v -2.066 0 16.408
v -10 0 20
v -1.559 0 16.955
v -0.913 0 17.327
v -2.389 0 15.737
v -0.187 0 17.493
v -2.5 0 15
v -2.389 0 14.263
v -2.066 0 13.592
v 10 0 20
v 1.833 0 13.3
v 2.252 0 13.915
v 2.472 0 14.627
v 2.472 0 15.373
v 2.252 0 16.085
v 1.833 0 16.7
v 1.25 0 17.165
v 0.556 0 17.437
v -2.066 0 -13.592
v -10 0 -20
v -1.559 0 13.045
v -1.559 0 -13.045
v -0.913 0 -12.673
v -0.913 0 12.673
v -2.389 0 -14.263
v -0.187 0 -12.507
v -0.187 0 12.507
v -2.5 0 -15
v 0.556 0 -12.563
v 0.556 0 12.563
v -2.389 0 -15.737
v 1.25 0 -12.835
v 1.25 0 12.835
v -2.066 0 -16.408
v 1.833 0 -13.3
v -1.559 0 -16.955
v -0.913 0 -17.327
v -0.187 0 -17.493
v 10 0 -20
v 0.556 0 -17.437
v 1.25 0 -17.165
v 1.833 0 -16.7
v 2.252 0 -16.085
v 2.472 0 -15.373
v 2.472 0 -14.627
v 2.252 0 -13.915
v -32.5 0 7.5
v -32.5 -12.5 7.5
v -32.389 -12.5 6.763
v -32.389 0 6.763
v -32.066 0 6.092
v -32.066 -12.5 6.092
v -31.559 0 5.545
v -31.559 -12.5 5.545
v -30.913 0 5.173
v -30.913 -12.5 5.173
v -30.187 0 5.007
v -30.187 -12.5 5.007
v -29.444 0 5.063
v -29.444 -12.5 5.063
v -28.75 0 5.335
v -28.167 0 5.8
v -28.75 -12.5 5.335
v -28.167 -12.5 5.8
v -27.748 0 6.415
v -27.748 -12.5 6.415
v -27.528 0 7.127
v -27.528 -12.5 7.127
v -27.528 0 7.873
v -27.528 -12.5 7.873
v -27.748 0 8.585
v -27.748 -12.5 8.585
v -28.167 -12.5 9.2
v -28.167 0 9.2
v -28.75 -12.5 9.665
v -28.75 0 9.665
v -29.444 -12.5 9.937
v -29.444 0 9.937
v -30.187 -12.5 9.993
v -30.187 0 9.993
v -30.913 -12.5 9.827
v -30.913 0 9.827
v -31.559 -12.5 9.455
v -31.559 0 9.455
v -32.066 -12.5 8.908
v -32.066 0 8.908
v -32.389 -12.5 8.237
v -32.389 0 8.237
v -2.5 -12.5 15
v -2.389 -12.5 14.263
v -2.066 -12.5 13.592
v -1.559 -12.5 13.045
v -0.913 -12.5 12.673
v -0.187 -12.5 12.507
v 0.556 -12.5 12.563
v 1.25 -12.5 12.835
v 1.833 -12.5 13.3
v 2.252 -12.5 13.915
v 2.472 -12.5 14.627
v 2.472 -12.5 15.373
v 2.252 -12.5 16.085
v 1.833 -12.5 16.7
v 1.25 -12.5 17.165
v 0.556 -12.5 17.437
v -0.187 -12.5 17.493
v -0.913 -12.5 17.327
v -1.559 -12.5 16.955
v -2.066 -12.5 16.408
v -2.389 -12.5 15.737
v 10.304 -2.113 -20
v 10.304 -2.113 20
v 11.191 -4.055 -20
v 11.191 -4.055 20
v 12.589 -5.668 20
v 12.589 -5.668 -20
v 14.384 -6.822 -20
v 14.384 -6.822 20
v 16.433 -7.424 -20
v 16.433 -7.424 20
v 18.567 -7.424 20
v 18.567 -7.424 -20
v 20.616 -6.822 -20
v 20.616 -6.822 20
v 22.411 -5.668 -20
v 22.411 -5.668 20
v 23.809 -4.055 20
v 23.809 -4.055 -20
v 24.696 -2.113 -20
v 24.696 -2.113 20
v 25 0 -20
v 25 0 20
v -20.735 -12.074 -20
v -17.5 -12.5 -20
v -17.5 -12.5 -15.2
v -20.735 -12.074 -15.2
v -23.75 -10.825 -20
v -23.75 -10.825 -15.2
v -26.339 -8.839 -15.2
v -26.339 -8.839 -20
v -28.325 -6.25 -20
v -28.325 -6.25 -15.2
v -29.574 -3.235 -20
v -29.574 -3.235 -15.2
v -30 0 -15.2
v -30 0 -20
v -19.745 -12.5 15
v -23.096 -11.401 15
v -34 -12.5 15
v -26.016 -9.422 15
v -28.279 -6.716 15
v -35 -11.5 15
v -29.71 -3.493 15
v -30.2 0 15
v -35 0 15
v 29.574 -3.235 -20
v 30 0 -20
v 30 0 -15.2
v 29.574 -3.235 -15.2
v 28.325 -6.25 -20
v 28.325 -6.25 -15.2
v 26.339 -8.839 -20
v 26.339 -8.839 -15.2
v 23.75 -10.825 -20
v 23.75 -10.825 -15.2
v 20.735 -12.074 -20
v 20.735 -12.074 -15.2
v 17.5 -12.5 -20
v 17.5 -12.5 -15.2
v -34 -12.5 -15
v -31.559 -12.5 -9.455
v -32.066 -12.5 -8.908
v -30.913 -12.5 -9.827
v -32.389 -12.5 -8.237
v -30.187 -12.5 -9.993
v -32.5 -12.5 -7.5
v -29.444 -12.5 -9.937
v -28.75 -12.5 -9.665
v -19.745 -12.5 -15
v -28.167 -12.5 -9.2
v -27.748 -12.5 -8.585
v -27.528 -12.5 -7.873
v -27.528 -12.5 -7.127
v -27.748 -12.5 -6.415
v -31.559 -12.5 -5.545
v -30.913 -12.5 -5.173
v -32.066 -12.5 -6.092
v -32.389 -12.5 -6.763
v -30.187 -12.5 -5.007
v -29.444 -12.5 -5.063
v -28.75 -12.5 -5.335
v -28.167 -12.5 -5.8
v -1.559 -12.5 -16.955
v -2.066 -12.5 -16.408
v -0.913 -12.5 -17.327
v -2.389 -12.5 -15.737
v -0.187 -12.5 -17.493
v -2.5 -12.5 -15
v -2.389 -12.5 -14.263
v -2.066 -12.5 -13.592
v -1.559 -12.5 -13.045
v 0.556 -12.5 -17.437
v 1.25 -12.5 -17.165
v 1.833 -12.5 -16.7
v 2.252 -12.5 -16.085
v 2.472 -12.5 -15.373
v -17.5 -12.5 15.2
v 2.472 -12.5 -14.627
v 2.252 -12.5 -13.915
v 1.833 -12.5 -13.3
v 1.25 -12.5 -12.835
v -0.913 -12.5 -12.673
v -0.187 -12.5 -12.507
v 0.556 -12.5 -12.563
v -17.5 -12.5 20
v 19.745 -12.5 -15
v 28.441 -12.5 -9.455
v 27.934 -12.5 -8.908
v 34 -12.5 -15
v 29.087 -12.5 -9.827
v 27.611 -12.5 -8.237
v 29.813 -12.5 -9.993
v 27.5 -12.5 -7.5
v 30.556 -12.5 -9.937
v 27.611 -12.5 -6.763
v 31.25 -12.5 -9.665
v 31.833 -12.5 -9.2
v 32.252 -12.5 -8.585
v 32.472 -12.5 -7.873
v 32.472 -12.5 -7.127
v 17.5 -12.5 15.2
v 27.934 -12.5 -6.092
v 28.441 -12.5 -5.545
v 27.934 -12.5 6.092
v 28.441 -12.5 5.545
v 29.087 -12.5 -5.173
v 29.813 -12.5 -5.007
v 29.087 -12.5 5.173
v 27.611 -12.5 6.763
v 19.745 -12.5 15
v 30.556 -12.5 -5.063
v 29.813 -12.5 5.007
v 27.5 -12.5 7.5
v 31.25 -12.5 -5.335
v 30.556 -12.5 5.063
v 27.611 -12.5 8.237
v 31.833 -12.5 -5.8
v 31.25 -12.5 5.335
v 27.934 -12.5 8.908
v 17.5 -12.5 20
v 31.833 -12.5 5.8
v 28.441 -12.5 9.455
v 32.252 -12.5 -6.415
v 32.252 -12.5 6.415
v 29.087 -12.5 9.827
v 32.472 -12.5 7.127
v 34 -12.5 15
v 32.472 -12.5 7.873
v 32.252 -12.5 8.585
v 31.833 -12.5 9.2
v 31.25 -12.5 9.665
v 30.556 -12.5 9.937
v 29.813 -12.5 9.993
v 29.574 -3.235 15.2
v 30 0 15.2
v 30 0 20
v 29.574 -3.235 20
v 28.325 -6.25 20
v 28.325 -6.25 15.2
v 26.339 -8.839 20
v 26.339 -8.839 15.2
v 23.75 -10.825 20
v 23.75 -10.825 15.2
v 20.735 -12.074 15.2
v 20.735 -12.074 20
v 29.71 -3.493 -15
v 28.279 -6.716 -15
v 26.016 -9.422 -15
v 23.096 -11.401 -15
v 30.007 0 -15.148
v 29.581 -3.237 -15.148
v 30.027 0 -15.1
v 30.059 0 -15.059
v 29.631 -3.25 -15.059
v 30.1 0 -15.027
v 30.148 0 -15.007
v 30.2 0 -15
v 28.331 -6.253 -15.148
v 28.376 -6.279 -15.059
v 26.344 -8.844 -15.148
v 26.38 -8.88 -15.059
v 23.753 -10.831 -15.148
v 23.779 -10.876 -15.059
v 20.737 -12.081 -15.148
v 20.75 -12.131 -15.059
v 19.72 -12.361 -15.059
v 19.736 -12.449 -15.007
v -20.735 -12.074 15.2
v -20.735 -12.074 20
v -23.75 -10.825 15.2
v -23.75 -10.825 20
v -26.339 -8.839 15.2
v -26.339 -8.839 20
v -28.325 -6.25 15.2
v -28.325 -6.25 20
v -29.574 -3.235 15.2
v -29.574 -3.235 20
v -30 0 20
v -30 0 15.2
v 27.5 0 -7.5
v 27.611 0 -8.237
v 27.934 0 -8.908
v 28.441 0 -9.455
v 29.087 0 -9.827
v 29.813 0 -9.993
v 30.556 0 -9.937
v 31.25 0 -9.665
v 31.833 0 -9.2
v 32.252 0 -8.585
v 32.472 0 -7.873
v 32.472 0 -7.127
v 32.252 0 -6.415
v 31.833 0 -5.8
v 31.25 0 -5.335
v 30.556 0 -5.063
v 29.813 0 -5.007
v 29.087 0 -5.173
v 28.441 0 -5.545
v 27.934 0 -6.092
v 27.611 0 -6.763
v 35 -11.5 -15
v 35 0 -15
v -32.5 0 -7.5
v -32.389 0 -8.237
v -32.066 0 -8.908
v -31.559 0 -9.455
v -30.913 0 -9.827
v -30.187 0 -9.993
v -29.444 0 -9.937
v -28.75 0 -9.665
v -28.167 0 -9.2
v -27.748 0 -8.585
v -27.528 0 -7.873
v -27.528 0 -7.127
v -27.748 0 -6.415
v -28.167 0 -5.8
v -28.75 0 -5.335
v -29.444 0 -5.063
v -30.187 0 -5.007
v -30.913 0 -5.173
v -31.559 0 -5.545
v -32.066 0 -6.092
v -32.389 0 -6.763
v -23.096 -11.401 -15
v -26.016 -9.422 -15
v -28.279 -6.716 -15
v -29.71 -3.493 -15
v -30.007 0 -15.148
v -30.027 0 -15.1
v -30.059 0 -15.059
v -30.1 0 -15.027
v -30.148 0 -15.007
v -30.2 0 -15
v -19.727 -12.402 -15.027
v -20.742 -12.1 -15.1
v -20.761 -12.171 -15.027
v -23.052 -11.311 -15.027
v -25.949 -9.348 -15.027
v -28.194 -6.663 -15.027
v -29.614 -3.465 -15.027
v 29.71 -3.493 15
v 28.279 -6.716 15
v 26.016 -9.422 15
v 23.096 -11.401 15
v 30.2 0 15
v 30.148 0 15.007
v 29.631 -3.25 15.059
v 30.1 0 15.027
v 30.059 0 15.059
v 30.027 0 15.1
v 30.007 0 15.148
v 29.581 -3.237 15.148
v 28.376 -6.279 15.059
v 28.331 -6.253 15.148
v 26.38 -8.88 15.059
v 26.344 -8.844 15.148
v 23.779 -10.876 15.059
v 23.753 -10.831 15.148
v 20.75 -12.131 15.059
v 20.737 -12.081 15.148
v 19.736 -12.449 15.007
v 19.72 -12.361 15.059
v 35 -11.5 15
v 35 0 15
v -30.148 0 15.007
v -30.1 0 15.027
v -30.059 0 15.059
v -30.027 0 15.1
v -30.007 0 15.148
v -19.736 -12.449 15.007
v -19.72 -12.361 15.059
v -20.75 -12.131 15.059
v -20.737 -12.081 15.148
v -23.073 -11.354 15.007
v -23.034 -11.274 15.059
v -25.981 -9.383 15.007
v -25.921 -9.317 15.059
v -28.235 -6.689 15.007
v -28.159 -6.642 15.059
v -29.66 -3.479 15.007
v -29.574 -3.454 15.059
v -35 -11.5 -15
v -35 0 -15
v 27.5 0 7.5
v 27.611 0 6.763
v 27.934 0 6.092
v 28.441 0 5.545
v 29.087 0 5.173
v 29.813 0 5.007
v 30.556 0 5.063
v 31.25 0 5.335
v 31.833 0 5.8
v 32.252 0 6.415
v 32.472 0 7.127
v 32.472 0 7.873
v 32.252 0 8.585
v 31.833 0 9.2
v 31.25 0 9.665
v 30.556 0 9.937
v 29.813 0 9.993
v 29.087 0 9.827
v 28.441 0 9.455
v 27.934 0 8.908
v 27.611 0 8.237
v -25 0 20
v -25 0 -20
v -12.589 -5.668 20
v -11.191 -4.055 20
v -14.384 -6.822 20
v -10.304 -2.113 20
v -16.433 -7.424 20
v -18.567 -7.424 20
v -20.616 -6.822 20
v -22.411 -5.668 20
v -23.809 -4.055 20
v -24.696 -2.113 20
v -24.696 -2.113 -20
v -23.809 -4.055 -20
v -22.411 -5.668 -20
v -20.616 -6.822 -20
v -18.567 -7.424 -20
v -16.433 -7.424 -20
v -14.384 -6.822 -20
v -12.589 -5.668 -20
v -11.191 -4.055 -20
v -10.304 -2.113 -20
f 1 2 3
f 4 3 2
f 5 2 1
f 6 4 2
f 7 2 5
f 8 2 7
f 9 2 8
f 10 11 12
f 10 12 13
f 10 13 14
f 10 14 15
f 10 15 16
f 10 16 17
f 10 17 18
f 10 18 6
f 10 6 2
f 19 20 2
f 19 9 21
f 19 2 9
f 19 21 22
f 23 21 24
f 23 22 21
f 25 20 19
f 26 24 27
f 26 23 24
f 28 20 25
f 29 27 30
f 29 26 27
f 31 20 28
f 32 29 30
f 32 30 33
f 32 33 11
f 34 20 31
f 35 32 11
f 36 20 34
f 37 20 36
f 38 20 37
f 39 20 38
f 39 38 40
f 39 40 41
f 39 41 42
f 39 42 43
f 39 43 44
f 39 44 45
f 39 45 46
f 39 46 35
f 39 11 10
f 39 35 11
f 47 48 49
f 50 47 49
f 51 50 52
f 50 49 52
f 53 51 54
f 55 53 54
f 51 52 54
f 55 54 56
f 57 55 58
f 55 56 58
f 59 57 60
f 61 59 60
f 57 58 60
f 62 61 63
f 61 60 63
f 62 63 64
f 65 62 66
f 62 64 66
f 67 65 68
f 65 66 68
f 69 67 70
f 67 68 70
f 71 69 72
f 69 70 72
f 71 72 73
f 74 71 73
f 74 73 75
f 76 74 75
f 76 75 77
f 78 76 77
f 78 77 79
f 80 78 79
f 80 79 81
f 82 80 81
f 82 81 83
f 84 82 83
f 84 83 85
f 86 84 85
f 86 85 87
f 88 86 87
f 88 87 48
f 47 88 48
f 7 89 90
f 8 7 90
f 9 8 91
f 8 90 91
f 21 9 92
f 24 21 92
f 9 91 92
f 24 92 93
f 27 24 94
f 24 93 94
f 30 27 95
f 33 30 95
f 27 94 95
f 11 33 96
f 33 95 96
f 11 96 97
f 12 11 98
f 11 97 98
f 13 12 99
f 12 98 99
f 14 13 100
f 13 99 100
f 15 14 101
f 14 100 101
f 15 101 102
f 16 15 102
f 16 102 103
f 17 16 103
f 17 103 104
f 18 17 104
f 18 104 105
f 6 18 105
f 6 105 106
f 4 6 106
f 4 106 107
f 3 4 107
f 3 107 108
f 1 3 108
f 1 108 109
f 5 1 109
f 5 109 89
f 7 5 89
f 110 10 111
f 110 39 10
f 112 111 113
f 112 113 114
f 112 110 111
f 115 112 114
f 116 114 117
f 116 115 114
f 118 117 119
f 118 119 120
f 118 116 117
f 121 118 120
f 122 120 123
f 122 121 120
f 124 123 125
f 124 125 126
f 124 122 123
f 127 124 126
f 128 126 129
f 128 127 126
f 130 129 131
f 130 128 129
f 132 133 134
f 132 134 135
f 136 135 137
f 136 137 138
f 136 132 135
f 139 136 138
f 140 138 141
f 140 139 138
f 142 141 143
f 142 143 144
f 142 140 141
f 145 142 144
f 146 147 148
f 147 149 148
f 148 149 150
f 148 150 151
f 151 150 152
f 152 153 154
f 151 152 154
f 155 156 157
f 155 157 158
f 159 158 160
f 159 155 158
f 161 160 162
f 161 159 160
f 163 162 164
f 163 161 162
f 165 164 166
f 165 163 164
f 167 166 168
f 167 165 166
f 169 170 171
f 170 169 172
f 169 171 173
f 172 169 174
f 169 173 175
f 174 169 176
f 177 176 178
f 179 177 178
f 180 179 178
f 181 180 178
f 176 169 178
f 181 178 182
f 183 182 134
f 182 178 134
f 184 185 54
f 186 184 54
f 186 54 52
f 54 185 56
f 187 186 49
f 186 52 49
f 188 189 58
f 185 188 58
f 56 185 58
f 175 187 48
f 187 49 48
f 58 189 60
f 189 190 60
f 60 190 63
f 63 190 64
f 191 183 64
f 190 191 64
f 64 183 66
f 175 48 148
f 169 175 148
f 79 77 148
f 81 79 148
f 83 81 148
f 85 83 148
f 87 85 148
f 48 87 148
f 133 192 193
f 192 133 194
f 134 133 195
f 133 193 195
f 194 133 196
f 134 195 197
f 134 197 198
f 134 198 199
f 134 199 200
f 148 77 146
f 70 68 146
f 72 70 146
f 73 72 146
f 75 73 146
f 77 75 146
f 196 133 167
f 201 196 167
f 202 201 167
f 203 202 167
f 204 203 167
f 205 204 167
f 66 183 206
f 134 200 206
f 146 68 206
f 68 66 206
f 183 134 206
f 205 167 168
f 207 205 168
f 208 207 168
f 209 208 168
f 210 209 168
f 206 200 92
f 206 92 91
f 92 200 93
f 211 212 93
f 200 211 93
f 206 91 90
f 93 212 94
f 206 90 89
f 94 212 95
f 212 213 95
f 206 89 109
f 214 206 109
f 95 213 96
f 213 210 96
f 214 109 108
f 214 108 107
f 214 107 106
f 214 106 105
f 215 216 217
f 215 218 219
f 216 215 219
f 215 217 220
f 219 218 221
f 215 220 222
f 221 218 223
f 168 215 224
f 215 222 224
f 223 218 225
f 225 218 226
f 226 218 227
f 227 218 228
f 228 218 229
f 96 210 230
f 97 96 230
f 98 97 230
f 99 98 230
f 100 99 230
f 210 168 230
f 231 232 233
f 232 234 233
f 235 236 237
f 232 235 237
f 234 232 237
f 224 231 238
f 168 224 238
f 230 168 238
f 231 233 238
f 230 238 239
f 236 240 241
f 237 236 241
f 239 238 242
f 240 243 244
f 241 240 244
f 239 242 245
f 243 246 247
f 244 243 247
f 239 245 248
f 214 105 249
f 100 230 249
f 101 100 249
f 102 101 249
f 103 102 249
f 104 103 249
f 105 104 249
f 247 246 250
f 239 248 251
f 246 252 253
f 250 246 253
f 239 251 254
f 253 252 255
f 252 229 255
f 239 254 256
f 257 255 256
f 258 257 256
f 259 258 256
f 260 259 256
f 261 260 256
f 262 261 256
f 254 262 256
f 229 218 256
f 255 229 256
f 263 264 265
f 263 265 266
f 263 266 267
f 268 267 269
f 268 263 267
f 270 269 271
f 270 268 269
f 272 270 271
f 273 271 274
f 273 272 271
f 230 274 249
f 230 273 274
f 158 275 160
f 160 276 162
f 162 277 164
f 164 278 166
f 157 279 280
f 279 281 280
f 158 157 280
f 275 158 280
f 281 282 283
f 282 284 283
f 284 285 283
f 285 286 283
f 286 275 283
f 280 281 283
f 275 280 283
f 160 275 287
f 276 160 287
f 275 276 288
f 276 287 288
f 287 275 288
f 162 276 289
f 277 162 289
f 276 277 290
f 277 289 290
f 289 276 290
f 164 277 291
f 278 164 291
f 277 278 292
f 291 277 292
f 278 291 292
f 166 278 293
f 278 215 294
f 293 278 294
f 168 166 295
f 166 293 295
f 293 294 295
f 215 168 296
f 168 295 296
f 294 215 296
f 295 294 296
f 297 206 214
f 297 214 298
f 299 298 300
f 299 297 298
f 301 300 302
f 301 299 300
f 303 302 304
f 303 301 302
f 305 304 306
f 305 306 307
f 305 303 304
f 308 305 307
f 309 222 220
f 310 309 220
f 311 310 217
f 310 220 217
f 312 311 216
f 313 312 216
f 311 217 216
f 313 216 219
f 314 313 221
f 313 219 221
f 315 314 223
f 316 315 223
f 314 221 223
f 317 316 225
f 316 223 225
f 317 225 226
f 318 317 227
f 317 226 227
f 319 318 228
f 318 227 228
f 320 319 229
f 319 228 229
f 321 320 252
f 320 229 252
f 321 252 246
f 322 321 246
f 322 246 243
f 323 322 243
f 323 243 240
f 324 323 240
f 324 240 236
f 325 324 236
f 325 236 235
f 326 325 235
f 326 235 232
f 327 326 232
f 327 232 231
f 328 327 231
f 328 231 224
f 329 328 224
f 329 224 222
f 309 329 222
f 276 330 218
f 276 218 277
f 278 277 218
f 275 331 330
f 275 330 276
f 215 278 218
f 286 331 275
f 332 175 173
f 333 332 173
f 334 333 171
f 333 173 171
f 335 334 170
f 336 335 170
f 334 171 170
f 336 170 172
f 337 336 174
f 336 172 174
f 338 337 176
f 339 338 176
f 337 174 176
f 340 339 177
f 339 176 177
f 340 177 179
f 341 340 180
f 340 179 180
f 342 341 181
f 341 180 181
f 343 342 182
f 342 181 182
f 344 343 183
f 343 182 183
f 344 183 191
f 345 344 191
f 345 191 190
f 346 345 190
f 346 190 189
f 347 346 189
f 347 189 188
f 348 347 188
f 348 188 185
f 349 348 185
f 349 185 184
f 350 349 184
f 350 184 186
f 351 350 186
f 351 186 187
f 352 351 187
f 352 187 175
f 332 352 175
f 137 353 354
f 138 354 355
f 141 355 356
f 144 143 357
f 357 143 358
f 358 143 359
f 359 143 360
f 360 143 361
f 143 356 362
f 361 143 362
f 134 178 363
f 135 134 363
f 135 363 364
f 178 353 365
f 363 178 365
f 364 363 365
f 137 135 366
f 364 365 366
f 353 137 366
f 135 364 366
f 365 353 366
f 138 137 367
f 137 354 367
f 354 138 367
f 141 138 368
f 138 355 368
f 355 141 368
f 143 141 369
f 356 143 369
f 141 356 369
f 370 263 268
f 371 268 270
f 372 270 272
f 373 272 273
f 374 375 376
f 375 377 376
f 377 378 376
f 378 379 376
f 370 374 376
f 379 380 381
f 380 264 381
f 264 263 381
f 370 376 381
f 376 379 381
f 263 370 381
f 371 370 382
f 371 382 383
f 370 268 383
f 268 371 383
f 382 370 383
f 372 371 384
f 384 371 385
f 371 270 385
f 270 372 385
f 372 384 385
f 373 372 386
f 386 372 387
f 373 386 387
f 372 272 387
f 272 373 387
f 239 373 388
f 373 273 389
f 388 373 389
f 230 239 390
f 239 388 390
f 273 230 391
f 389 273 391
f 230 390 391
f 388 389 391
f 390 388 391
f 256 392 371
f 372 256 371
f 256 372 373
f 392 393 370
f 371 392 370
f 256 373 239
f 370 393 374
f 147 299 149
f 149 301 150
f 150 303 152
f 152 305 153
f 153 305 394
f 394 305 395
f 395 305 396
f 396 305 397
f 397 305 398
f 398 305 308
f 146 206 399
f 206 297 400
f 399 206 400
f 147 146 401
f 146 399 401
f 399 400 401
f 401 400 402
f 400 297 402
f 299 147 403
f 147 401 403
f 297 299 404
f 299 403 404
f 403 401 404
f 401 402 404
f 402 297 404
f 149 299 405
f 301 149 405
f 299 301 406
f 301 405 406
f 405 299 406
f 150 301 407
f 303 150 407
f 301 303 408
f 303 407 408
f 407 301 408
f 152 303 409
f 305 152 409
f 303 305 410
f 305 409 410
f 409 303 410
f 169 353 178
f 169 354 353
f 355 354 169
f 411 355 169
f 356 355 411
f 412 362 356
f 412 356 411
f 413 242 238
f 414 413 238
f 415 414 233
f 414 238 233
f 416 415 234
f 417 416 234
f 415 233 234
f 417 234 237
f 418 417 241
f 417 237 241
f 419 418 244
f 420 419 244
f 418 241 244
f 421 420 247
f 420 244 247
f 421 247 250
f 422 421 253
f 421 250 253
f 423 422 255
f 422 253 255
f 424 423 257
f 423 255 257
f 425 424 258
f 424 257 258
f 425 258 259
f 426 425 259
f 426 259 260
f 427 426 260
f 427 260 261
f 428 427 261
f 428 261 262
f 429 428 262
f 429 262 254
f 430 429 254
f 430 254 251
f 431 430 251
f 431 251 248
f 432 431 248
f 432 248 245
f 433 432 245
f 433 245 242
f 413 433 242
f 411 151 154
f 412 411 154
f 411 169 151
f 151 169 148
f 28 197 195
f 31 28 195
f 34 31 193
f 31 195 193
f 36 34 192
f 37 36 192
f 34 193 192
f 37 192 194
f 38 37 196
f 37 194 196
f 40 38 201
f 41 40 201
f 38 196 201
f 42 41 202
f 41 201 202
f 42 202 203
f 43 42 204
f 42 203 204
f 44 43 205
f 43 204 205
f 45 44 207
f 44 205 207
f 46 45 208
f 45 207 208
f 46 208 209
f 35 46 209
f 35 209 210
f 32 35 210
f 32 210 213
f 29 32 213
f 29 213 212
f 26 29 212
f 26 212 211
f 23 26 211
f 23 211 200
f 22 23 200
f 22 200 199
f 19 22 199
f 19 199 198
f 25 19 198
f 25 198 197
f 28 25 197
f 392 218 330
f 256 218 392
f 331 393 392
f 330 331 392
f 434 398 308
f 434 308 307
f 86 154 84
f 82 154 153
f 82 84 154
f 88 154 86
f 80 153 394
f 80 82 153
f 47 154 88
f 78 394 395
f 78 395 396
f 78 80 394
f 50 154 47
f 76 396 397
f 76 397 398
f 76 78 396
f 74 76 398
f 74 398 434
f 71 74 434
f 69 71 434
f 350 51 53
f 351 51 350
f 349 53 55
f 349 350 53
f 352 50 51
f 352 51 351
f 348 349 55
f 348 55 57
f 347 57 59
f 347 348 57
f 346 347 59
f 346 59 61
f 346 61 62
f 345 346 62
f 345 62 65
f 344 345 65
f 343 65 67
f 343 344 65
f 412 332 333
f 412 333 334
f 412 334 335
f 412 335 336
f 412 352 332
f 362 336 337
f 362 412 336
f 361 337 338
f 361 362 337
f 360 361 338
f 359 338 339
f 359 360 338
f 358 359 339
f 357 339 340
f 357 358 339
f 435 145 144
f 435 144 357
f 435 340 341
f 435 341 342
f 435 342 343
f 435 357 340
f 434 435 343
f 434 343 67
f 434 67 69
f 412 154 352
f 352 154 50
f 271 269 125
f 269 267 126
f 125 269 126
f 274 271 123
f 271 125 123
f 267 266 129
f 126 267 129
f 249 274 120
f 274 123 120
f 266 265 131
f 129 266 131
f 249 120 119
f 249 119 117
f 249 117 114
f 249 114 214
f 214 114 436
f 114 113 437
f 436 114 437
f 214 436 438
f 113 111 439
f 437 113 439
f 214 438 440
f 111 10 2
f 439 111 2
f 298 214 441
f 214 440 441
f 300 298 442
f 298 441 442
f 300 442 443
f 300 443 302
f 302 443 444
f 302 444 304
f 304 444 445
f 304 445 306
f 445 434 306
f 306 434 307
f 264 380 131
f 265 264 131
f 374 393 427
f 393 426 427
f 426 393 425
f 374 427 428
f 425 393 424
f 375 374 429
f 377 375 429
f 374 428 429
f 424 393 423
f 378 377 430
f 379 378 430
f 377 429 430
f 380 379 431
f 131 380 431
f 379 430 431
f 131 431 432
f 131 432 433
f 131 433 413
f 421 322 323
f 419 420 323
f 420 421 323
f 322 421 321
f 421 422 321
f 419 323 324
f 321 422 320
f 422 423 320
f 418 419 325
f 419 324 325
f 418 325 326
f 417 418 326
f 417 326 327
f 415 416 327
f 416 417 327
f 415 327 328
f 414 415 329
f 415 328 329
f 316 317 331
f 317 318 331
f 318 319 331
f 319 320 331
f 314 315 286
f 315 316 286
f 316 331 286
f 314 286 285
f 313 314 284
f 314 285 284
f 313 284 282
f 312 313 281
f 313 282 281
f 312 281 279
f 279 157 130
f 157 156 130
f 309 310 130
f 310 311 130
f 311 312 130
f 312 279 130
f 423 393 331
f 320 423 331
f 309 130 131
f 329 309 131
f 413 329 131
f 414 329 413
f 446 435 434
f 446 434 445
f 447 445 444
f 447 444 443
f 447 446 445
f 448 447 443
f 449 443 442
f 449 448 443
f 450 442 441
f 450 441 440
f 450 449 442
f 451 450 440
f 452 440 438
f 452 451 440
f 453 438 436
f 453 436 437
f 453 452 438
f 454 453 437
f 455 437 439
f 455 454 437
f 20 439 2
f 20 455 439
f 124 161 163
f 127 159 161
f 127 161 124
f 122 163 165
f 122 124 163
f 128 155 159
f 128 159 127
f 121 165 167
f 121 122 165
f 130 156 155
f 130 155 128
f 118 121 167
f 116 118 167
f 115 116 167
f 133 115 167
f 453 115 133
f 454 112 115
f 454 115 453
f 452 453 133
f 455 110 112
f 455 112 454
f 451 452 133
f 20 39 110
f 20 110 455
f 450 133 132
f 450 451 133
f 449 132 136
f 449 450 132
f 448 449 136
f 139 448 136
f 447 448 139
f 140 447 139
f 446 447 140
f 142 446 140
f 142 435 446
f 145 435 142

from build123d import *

# Parameters (mm, degrees)
EXTRUDE_1_DEPTH      = 20
EXTRUDE_1_DEPTH_BACK = 20
EXTRUDE_2_DEPTH      = 15
EXTRUDE_2_DEPTH_BACK = 15
CHAMFER_1_SIZE       = 1
HOLE_WIZARD_5_0_1_D  = 5
FILLET_1_R           = 0.2


with BuildPart() as part:
    # Эскиз1 → Бобышка-Вытянуть1 (new, two sides: drawn at the far end of the back side and taken through both)
    with BuildSketch(Plane.XY.offset(-EXTRUDE_1_DEPTH_BACK)):
        with BuildLine():
            Line((17.5, -12.5), (-17.5, -12.5))
            ThreePointArc((-17.5, -12.5), (-26.338834764831844, -8.838834764831844), (-30.000000000000004, 0))
            Line((-30.000000000000004, 0), (-25, 0))
            ThreePointArc((-25, 0), (-17.5, -7.499999999999998), (-10.000000000000002, 0))
            Line((-10.000000000000002, 0), (10.000000000000002, 0))
            ThreePointArc((10.000000000000002, 0), (17.5, -7.499999999999998), (25, 0))
            Line((25, 0), (30.000000000000004, 0))
            ThreePointArc((30.000000000000004, 0), (26.338834764831844, -8.838834764831843), (17.5, -12.5))
        make_face()
    extrude(amount=EXTRUDE_1_DEPTH + EXTRUDE_1_DEPTH_BACK)

    # Эскиз2 → Бобышка-Вытянуть2 (add, two sides: drawn at the far end of the back side and taken through both)
    with BuildSketch(Plane.XY.offset(-EXTRUDE_2_DEPTH_BACK)):
        with BuildLine():
            Line((30.000000000000004, 0), (35, 0))
            Line((35, 0), (35, -12.499999999999996))
            Line((35, -12.499999999999996), (17.5, -12.5))
            Line((17.5, -12.5), (-17.500000000000004, -12.5))
            Line((-17.500000000000004, -12.5), (-35, -12.499999999999996))
            Line((-35, -12.499999999999996), (-35, 0))
            Line((-35, 0), (-30.000000000000004, 1.53e-15))
            Line((-30.000000000000004, 1.53e-15), (-25, 9.2e-16))
            ThreePointArc((-25, 9.2e-16), (-17.5, -7.499999999999998), (-10.000000000000002, 0))
            Line((-10.000000000000002, 0), (10.000000000000002, 9.2e-16))
            ThreePointArc((10.000000000000002, 9.2e-16), (17.5, -7.499999999999998), (25, 0))
            Line((25, 0), (30.000000000000004, 0))
        make_face()
    extrude(amount=EXTRUDE_2_DEPTH + EXTRUDE_2_DEPTH_BACK)

    # Фаска1
    chamfer_1_edges = [part.edges().sort_by_distance(p)[0] for p in [
        (35, -12.499999999999996, 0),
        (-35, -12.499999999999996, 0),
    ]]
    chamfer(chamfer_1_edges, length=CHAMFER_1_SIZE)

    # Отверстия под штифты Ø5.0 мм1 (through all)
    with Locations(Plane(origin=(0, 0, 0), x_dir=(1, 0, 0), z_dir=(0, 1, 0))):
        with Locations((0, 15), (0, -15), (-30, -7.5), (-30, 7.5), (30, 7.5), (30, -7.5)):
            Hole(HOLE_WIZARD_5_0_1_D / 2)

    # Скругление1
    # the kernel refuses this fillet: 0.2 mm, written as the material it adds along each edge
    with BuildSketch(Plane(origin=(-17.5, 4.44e-15, -15), x_dir=(0.19874807030113847, -0.9800506132601386, 0), z_dir=(0.9800506132601386, 0.19874807030113847, 0))) as fillet_1_piece_1_section:
        with BuildLine():
            CenterArc((12.500000000000004 + FILLET_1_R, FILLET_1_R), FILLET_1_R, 180, 90)
            Line((12.500000000000004, FILLET_1_R), (12.500000000000004, 0))
            Line((12.500000000000004, 0), (12.500000000000004 + FILLET_1_R, 0))
        make_face()
    fillet_1_piece_1 = revolve(axis=Axis((-17.5, 4.44e-15, -15), (0, 0, -1)), revolution_arc=101.46375913899153, mode=Mode.PRIVATE)
    fillet_1_piece_1 = split(fillet_1_piece_1, bisect_by=Plane(origin=(-17.5, -12.5, -15), z_dir=(0, 1, 0)), keep=Keep.TOP, mode=Mode.PRIVATE)
    add(fillet_1_piece_1)
    with BuildSketch(Plane(origin=(-17.5, 4.44e-15, 15), x_dir=(0.19874807030113847, -0.9800506132601386, 0), z_dir=(0.9800506132601386, 0.19874807030113847, 0))) as fillet_1_piece_2_section:
        with BuildLine():
            CenterArc((12.500000000000004 + FILLET_1_R, -FILLET_1_R), FILLET_1_R, 90, 90)
            Line((12.500000000000004, -FILLET_1_R), (12.500000000000004, 0))
            Line((12.500000000000004, 0), (12.500000000000004 + FILLET_1_R, 0))
        make_face()
    fillet_1_piece_2 = revolve(axis=Axis((-17.5, 4.44e-15, 15), (0, 0, -1)), revolution_arc=101.46375913899153, mode=Mode.PRIVATE)
    fillet_1_piece_2 = split(fillet_1_piece_2, bisect_by=Plane(origin=(-17.5, -12.5, 15), z_dir=(0, 1, 0)), keep=Keep.TOP, mode=Mode.PRIVATE)
    add(fillet_1_piece_2)
    with BuildSketch(Plane(origin=(17.499999999999993, 1.199e-14, 15), x_dir=(1, -9.6e-16, 0), z_dir=(9.6e-16, 1, 0))) as fillet_1_piece_3_section:
        with BuildLine():
            CenterArc((12.50000000000001 + FILLET_1_R, -FILLET_1_R), FILLET_1_R, 90, 90)
            Line((12.50000000000001 + FILLET_1_R, 0), (12.50000000000001, 0))
            Line((12.50000000000001, 0), (12.50000000000001, -FILLET_1_R))
        make_face()
    fillet_1_piece_3 = revolve(axis=Axis((17.499999999999993, 1.199e-14, 15), (0, 0, -1)), revolution_arc=101.46375913899143, mode=Mode.PRIVATE)
    fillet_1_piece_3 = split(fillet_1_piece_3, bisect_by=Plane(origin=(17.499999999999993, -12.5, 15), z_dir=(0, 1, 0)), keep=Keep.TOP, mode=Mode.PRIVATE)
    add(fillet_1_piece_3)
    with BuildSketch(Plane(origin=(17.499999999999993, 1.199e-14, -15), x_dir=(1, -9.6e-16, 0), z_dir=(9.6e-16, 1, 0))) as fillet_1_piece_4_section:
        with BuildLine():
            CenterArc((12.50000000000001 + FILLET_1_R, FILLET_1_R), FILLET_1_R, 180, 90)
            Line((12.50000000000001 + FILLET_1_R, 0), (12.50000000000001, 0))
            Line((12.50000000000001, 0), (12.50000000000001, FILLET_1_R))
        make_face()
    fillet_1_piece_4 = revolve(axis=Axis((17.499999999999993, 1.199e-14, -15), (0, 0, -1)), revolution_arc=101.46375913899143, mode=Mode.PRIVATE)
    fillet_1_piece_4 = split(fillet_1_piece_4, bisect_by=Plane(origin=(17.499999999999993, -12.5, -15), z_dir=(0, 1, 0)), keep=Keep.TOP, mode=Mode.PRIVATE)
    add(fillet_1_piece_4)


solid = part.part
